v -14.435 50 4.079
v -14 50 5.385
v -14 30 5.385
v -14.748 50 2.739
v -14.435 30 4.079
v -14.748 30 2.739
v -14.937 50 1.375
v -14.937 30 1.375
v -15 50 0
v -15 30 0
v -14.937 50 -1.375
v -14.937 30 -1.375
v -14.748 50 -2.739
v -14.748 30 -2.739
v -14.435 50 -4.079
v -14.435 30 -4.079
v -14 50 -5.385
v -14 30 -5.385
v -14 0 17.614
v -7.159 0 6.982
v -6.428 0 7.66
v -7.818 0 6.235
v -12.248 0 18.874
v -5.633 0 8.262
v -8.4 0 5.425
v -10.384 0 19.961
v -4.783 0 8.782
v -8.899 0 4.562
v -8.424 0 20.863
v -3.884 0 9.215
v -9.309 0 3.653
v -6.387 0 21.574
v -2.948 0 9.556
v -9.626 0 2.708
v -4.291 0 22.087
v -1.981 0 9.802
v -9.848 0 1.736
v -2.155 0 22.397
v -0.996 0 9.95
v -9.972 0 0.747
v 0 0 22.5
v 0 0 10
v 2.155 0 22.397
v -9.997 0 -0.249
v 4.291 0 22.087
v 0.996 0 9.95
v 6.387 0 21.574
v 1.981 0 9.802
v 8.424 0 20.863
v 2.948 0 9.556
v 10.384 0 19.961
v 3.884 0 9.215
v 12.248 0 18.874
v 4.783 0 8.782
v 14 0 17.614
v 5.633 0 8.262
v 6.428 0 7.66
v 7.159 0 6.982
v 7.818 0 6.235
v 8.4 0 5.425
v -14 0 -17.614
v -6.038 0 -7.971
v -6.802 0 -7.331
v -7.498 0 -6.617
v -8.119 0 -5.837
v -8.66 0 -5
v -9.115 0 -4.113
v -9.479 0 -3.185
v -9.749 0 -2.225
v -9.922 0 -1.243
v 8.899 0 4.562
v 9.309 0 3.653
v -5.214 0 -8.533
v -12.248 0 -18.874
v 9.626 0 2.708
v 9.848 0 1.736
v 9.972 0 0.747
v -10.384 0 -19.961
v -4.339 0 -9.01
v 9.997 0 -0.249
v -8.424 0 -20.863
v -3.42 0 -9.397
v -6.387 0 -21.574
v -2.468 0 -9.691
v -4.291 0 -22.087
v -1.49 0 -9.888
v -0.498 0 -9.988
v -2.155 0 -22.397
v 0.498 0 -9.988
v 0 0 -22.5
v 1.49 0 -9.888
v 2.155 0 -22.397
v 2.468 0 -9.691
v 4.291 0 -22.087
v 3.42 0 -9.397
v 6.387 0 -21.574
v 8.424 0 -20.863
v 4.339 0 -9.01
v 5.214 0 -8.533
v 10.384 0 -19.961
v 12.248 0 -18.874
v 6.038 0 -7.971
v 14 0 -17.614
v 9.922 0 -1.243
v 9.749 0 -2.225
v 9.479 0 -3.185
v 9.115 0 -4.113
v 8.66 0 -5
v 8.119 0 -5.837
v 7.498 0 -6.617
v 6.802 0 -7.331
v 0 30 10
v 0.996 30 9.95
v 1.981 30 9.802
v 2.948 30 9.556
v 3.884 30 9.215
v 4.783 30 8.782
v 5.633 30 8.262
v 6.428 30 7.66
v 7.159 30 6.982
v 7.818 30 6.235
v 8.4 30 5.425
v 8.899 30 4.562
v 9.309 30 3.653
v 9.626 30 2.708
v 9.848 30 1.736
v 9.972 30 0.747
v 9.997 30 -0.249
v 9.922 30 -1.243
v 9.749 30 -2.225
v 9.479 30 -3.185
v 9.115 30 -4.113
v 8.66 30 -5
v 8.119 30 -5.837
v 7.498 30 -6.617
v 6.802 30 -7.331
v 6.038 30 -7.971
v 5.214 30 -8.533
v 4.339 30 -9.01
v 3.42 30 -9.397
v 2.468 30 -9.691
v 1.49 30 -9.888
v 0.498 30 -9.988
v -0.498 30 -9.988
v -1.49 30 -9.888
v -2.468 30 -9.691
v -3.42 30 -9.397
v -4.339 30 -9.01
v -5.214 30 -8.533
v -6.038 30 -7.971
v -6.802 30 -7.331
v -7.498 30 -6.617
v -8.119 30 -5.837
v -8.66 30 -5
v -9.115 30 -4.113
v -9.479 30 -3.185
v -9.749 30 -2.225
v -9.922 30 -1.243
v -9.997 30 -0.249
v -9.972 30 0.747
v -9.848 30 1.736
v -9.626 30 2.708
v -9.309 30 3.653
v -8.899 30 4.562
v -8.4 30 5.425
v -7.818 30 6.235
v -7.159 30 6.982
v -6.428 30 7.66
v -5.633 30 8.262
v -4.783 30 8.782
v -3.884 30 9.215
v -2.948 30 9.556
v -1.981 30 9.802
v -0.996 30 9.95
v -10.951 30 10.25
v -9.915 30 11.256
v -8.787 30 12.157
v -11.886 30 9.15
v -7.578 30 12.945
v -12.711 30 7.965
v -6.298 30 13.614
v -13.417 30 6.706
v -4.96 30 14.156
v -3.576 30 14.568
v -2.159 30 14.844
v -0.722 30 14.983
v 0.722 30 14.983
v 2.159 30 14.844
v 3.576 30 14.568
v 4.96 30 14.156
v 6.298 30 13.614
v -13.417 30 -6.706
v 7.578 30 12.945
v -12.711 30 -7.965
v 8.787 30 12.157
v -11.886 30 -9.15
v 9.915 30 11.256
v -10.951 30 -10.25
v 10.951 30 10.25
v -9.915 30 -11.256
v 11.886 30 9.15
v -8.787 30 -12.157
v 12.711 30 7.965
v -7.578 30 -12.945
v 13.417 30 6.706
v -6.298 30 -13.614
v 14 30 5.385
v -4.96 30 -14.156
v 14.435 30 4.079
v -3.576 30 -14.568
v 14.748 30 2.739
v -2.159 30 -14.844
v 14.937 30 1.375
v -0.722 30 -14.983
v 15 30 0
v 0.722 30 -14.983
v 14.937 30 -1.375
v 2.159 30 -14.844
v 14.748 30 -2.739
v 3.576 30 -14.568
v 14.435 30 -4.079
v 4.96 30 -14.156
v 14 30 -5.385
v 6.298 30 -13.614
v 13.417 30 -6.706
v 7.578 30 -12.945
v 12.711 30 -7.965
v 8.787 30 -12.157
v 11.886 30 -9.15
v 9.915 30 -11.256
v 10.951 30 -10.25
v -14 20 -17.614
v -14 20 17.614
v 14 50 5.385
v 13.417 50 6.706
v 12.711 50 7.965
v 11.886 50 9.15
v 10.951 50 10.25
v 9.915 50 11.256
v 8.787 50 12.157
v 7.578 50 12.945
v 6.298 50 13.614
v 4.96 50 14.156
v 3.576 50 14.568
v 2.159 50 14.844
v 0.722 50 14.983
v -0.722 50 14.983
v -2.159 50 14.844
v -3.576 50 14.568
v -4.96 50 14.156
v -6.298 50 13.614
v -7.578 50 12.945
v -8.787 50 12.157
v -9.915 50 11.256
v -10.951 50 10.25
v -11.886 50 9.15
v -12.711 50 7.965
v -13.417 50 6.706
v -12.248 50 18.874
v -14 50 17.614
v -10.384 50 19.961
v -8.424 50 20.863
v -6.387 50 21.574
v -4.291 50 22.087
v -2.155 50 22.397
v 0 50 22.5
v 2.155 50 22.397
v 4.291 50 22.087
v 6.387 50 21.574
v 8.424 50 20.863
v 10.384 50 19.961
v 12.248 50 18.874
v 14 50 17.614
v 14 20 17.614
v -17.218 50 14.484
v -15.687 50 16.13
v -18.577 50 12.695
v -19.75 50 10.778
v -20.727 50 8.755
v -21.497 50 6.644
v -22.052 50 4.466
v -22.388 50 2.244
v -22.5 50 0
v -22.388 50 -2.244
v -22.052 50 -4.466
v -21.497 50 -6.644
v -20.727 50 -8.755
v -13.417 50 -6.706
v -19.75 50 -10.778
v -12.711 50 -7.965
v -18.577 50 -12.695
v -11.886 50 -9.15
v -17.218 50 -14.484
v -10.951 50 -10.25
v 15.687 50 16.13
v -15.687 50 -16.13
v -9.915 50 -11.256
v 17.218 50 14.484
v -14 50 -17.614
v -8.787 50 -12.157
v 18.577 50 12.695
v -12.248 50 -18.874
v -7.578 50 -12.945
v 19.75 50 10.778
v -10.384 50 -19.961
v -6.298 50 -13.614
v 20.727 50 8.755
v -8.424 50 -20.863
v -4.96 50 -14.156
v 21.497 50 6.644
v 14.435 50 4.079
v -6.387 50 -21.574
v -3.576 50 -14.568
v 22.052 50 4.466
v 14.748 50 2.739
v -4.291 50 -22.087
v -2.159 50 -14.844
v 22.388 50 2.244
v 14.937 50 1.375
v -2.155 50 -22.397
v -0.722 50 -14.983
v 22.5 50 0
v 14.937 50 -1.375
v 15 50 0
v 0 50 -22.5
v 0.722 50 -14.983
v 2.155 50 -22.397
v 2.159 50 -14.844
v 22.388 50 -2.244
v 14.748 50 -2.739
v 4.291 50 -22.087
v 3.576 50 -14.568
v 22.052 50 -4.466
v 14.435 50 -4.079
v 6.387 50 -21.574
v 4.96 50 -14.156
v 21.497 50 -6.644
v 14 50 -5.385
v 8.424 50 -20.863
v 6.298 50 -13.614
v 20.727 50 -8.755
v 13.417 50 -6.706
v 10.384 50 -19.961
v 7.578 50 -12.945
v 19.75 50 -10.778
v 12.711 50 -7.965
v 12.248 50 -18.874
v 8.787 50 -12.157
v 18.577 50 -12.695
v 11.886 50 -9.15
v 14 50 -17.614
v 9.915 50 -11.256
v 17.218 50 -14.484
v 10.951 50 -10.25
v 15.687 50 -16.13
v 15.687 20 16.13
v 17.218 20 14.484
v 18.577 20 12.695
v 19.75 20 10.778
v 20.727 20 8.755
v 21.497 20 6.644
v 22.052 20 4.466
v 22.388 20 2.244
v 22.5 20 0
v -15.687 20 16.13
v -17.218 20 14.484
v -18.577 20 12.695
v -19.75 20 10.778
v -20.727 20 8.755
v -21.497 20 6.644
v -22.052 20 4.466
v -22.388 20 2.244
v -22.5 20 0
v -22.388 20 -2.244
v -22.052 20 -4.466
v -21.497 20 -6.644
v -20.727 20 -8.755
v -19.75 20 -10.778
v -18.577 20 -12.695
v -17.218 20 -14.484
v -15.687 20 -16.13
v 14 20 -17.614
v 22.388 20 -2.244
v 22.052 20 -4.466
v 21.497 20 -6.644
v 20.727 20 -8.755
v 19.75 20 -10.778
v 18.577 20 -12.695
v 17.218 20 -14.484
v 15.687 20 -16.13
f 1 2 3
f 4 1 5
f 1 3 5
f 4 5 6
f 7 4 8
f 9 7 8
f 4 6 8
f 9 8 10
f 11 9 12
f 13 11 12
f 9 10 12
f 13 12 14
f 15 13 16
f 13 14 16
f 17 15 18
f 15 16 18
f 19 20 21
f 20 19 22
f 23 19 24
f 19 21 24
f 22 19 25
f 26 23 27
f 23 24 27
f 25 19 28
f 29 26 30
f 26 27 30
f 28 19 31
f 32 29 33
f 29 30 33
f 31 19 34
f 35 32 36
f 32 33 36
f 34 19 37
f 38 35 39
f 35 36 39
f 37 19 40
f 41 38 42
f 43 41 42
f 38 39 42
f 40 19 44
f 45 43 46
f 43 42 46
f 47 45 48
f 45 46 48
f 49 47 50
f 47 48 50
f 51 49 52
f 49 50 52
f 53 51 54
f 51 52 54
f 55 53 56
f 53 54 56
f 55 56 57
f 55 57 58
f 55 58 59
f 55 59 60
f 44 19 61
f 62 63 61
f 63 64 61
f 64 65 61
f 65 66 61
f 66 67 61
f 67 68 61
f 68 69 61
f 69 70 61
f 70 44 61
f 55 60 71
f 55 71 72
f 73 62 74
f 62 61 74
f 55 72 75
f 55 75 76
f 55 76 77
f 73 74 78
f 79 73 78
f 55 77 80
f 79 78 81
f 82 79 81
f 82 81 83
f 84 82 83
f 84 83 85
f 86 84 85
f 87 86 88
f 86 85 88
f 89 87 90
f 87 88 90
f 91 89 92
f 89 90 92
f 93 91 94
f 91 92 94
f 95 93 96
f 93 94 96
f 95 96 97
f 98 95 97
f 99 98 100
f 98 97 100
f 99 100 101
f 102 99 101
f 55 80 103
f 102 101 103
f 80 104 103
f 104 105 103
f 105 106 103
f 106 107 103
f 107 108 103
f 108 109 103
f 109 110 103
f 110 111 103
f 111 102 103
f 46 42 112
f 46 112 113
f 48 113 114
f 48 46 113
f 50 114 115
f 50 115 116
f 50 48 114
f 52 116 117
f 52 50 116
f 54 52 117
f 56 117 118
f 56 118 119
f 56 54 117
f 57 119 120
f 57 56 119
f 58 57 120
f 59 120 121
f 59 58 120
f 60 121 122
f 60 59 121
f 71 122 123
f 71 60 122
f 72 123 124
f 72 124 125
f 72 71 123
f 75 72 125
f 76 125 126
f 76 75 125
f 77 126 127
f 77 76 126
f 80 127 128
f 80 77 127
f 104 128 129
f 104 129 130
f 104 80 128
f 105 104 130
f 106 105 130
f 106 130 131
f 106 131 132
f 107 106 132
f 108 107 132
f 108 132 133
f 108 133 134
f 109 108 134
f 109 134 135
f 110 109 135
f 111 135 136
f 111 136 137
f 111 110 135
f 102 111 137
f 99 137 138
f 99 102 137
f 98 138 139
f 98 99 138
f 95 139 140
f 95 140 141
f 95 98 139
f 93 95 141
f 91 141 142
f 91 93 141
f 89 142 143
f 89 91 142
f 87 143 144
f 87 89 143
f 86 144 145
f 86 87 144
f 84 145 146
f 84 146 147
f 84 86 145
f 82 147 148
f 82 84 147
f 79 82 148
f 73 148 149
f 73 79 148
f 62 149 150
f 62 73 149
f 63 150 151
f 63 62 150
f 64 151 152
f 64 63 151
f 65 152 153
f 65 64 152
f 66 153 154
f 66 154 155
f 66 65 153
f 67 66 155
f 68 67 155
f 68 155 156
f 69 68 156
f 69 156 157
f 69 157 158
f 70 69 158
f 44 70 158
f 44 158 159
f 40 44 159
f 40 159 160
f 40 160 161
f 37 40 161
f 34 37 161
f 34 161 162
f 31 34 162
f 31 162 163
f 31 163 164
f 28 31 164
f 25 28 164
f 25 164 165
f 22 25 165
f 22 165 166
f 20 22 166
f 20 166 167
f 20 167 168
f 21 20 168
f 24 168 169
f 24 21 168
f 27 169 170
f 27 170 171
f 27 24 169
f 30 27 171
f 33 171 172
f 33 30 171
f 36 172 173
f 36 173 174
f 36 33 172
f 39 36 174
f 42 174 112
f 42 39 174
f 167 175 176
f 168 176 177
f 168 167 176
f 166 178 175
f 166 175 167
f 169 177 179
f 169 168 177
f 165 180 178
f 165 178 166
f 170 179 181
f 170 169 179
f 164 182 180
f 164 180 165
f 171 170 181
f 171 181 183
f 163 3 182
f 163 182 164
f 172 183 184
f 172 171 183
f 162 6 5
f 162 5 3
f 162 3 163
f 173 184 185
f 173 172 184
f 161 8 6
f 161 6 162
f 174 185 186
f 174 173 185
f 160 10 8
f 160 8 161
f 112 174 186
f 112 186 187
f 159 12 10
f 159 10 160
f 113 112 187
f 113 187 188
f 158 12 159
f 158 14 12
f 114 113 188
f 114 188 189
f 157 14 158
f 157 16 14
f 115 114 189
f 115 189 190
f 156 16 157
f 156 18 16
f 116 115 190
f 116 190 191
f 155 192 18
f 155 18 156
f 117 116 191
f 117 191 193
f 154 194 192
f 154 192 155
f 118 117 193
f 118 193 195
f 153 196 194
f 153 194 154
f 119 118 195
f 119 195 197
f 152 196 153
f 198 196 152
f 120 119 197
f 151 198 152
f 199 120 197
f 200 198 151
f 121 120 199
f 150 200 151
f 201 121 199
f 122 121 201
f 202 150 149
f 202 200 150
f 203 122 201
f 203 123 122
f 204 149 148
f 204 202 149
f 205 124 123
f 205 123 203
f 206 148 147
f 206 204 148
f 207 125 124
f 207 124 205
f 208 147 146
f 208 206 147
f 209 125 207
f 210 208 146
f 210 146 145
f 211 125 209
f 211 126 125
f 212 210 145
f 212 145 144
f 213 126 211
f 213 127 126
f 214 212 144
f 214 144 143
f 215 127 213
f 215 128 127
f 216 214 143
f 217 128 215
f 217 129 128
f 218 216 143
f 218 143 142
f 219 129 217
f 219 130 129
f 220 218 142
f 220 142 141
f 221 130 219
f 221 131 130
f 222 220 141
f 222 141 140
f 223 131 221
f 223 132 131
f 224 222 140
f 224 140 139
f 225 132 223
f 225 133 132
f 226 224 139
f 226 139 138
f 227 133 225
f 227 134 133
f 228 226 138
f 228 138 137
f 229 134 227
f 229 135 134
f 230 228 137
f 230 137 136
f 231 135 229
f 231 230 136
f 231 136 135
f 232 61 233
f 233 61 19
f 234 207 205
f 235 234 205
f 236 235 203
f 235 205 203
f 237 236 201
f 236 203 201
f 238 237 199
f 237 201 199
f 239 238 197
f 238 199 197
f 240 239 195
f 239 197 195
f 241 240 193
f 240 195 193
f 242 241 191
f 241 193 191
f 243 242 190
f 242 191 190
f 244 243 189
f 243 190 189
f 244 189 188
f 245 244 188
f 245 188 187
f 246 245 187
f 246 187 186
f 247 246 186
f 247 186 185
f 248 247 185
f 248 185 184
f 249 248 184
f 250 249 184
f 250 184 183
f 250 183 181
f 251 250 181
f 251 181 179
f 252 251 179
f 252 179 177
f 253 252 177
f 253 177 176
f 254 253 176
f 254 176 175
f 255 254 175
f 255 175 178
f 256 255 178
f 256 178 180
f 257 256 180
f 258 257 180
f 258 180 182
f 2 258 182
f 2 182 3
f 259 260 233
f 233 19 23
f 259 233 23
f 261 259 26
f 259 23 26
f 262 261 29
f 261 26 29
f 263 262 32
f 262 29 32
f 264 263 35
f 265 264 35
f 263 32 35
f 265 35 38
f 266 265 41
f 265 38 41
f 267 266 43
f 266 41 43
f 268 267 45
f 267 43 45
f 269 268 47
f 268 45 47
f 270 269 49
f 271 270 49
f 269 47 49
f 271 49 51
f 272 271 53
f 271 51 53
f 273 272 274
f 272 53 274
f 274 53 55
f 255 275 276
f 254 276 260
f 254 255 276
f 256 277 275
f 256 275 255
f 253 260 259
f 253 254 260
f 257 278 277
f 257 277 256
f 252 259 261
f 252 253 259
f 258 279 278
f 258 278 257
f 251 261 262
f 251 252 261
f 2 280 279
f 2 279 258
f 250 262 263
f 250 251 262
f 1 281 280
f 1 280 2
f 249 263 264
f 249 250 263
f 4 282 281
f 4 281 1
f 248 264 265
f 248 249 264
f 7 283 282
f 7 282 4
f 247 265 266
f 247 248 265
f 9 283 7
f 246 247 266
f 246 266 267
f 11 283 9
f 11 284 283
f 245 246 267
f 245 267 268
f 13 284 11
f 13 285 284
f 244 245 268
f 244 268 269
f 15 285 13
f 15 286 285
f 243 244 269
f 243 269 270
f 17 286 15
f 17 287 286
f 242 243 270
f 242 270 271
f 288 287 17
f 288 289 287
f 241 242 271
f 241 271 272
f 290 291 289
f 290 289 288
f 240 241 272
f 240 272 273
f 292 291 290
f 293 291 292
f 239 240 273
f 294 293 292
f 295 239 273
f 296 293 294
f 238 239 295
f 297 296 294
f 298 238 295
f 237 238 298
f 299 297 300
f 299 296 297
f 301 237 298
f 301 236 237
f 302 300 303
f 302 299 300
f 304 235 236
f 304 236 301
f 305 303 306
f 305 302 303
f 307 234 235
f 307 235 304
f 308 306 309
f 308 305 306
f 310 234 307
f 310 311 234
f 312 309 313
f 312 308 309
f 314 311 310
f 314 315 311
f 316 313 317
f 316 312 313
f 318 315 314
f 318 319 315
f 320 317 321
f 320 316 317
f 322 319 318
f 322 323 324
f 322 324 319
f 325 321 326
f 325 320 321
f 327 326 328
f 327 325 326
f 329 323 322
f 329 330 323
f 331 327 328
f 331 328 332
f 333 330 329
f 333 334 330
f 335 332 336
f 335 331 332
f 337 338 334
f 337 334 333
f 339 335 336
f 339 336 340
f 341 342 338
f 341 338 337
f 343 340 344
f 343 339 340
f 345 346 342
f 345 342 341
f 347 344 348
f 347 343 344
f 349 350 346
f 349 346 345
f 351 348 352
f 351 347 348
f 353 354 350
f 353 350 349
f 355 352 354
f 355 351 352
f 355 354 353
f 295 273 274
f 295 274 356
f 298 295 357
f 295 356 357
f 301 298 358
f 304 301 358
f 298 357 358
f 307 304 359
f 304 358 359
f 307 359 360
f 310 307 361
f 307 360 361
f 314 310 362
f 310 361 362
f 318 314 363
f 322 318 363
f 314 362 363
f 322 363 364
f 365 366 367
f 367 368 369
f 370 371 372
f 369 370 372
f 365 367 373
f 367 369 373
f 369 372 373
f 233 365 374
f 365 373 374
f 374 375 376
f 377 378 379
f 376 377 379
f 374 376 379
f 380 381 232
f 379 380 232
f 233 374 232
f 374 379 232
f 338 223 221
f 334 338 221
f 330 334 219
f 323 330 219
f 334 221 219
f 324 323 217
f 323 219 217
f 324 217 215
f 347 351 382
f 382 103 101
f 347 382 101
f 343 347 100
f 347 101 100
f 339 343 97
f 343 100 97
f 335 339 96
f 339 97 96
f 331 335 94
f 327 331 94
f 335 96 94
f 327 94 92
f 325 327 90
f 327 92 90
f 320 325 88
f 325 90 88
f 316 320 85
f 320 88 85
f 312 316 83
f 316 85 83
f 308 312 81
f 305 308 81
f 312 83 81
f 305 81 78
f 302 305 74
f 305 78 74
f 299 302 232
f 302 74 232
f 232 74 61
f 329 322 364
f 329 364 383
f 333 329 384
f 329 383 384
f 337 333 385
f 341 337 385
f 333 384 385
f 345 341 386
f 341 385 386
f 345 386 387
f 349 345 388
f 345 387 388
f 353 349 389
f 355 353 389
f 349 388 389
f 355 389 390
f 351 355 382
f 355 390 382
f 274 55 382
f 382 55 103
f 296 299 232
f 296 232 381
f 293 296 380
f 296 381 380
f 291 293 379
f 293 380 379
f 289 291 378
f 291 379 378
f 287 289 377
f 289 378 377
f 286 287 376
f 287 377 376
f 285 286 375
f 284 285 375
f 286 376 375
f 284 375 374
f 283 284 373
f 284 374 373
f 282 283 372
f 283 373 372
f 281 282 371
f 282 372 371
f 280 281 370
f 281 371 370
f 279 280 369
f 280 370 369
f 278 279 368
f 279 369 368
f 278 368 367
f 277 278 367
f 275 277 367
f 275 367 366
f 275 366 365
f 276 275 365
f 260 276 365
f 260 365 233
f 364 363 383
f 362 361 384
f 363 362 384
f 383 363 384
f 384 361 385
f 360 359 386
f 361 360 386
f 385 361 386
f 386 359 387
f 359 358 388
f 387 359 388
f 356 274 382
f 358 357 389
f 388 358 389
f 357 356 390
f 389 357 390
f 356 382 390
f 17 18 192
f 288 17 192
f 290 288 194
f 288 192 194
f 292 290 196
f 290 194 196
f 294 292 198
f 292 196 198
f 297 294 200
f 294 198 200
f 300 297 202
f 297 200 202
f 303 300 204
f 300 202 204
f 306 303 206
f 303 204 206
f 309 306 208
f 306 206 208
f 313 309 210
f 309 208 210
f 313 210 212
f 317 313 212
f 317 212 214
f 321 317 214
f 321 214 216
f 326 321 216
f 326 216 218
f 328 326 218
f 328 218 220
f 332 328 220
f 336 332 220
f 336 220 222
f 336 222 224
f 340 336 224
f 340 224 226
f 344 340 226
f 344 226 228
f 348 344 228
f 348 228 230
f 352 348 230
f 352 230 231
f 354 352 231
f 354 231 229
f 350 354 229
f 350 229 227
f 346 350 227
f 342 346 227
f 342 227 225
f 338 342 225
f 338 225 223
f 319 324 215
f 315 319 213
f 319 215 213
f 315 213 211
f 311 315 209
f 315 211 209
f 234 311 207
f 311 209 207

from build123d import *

# Parameters (mm, degrees)
BOSS_EXTRUDE5_DEPTH   = 50
BOSS_EXTRUDE5_2_DEPTH = 50
BOSS_EXTRUDE6_START   = 20
BOSS_EXTRUDE6_DEPTH   = 30
SKETCH1_5_R           = 10
BOSS_EXTRUDE7_DEPTH   = 30
BOSS_EXTRUDE8_START   = 20
BOSS_EXTRUDE8_DEPTH   = 10


with BuildPart() as part:
    # Sketch1 → Boss-Extrude5 (new body)
    with BuildSketch(Plane(origin=(0, 0, 0), x_dir=(1, 0, 0), z_dir=(0, 1, 0))):
        with BuildLine():
            Line((-14, -5.385164807), (-14, -17.613914954))
            ThreePointArc((-14, -17.613914954), (0, -22.5), (14, -17.613914954))
            Line((14, -17.613914954), (14, -5.385164807))
            ThreePointArc((14, -5.385164807), (0, -15), (-14, -5.385164807))
        make_face()
    extrude(amount=BOSS_EXTRUDE5_DEPTH)



with BuildPart() as body_2:
    # Sketch1 → Boss-Extrude5 2 (new body)
    with BuildSketch(Plane(origin=(0, 0, 0), x_dir=(1, 0, 0), z_dir=(0, 1, 0))):
        with BuildLine():
            ThreePointArc((14, 17.613914954), (0, 22.5), (-14, 17.613914954))
            Line((-14, 17.613914954), (-14, 5.385164807))
            ThreePointArc((-14, 5.385164807), (0, 15), (14, 5.385164807))
            Line((14, 5.385164807), (14, 17.613914954))
        make_face()
    extrude(amount=BOSS_EXTRUDE5_2_DEPTH)


with BuildPart() as part_1:
    add(part.part)

    add(body_2.part)  # Boss-Extrude6 merges body 2
    # Sketch1<4> → Boss-Extrude6 (add)
    with BuildSketch(Plane(origin=(0, 0, 0), x_dir=(1, 0, 0), z_dir=(0, 1, 0)).offset(BOSS_EXTRUDE6_START)):
        with BuildLine():
            ThreePointArc((-14, 17.613914954), (-22.5, 0), (-14, -17.613914954))
            Line((-14, -17.613914954), (-14, -5.385164807))
            ThreePointArc((-14, -5.385164807), (-15, 0), (-14, 5.385164807))
            Line((-14, 5.385164807), (-14, 17.613914954))
        make_face()
        with BuildLine():
            Line((14, -5.385164807), (14, -17.613914954))
            ThreePointArc((14, -17.613914954), (22.5, 0), (14, 17.613914954))
            Line((14, 17.613914954), (14, 5.385164807))
            ThreePointArc((14, 5.385164807), (15, 0), (14, -5.385164807))
        make_face()
    extrude(amount=BOSS_EXTRUDE6_DEPTH)

    # Sketch1<5> → Boss-Extrude7 (add)
    with BuildSketch(Plane(origin=(0, 0, 0), x_dir=(1, 0, 0), z_dir=(0, 1, 0))):
        with BuildLine():
            Line((-14, 5.385164807), (-14, -5.385164807))
            ThreePointArc((-14, -5.385164807), (0, -15), (14, -5.385164807))
            Line((14, -5.385164807), (14, 5.385164807))
            ThreePointArc((14, 5.385164807), (0, 15), (-14, 5.385164807))
        make_face()
        Circle(SKETCH1_5_R, mode=Mode.SUBTRACT)
    extrude(amount=BOSS_EXTRUDE7_DEPTH)

    # Sketch1<6> → Boss-Extrude8 (add)
    with BuildSketch(Plane(origin=(0, 0, 0), x_dir=(1, 0, 0), z_dir=(0, 1, 0)).offset(BOSS_EXTRUDE8_START)):
        with BuildLine():
            ThreePointArc((-14, 5.385164807), (-15, 0), (-14, -5.385164807))
            Line((-14, -5.385164807), (-14, 5.385164807))
        make_face()
        with BuildLine():
            Line((14, 5.385164807), (14, -5.385164807))
            ThreePointArc((14, -5.385164807), (15, 0), (14, 5.385164807))
        make_face()
    extrude(amount=BOSS_EXTRUDE8_DEPTH)


solid = part_1.part
